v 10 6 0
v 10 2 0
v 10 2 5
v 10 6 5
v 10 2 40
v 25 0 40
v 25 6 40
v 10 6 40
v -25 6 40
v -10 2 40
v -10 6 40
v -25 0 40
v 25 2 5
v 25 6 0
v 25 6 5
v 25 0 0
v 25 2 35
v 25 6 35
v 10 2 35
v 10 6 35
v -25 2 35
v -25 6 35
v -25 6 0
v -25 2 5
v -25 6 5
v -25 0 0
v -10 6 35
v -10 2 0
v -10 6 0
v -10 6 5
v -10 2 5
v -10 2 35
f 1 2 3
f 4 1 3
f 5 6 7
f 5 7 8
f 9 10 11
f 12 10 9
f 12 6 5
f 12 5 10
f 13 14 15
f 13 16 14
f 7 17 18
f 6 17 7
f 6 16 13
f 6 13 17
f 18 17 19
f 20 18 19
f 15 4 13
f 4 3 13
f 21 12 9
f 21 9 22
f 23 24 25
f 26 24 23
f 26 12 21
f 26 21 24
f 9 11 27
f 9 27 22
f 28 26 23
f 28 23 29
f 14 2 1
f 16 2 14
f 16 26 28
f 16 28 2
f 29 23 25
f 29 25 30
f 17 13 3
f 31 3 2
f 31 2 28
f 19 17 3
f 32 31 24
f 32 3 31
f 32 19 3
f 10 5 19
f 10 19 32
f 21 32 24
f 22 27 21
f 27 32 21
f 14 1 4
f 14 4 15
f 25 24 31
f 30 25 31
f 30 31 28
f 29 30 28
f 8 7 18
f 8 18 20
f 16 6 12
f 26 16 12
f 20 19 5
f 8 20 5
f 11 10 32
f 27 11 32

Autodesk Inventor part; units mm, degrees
ref_plane "YZ Plane" through (0, 0, 0) normal (1, 0, 0) x (0, 1, 0)
ref_plane "XZ Plane" through (0, 0, 0) normal (0, 1, 0) x (-1, 0, 0)
ref_plane "XY Plane" through (0, 0, 0) normal (0, 0, 1) x (1, 0, 0)
sketch "Эскиз1" plane through (0, 0, 0) normal (0, 1, 0) x (-1, 0, 0)
  line L0 (0, 0) -> (-25, 0)
  line L1 (-25, 0) -> (-25, 20)
  line L2 (-25, 20) -> (0, 20)
  line L3 (0, 20) -> (0, 0)
  dimension "d0" = 25
  dimension "d1" = 20
extrude "Выдавливание1" add sketch "Эскиз1" along normal blind 2
sketch "Эскиз2" plane through (0, 2, 0) normal (0, 1, 0) x (1, 0, 0)
  line L0 (25, -20) -> (25, 0) projected
  line L1 (25, 0) -> (10, 0)
  line L2 (10, 0) -> (10, -5)
  line L3 (10, -5) -> (25, -5)
  line L4 (25, -5) -> (25, 0)
  point P0 (0, 0)
  dimension "d4" = 15
  dimension "d5" = 5
extrude "Выдавливание2" add sketch "Эскиз2" along normal blind 4
mirror "Зеркальное отражение1" about plane through (0, 0, 20) normal (0, 0, 1)
mirror "Зеркальное отражение2" about plane through (0, 0, 0) normal (-1, 0, 0)
properties part number "крышка кожуха нижняя"
